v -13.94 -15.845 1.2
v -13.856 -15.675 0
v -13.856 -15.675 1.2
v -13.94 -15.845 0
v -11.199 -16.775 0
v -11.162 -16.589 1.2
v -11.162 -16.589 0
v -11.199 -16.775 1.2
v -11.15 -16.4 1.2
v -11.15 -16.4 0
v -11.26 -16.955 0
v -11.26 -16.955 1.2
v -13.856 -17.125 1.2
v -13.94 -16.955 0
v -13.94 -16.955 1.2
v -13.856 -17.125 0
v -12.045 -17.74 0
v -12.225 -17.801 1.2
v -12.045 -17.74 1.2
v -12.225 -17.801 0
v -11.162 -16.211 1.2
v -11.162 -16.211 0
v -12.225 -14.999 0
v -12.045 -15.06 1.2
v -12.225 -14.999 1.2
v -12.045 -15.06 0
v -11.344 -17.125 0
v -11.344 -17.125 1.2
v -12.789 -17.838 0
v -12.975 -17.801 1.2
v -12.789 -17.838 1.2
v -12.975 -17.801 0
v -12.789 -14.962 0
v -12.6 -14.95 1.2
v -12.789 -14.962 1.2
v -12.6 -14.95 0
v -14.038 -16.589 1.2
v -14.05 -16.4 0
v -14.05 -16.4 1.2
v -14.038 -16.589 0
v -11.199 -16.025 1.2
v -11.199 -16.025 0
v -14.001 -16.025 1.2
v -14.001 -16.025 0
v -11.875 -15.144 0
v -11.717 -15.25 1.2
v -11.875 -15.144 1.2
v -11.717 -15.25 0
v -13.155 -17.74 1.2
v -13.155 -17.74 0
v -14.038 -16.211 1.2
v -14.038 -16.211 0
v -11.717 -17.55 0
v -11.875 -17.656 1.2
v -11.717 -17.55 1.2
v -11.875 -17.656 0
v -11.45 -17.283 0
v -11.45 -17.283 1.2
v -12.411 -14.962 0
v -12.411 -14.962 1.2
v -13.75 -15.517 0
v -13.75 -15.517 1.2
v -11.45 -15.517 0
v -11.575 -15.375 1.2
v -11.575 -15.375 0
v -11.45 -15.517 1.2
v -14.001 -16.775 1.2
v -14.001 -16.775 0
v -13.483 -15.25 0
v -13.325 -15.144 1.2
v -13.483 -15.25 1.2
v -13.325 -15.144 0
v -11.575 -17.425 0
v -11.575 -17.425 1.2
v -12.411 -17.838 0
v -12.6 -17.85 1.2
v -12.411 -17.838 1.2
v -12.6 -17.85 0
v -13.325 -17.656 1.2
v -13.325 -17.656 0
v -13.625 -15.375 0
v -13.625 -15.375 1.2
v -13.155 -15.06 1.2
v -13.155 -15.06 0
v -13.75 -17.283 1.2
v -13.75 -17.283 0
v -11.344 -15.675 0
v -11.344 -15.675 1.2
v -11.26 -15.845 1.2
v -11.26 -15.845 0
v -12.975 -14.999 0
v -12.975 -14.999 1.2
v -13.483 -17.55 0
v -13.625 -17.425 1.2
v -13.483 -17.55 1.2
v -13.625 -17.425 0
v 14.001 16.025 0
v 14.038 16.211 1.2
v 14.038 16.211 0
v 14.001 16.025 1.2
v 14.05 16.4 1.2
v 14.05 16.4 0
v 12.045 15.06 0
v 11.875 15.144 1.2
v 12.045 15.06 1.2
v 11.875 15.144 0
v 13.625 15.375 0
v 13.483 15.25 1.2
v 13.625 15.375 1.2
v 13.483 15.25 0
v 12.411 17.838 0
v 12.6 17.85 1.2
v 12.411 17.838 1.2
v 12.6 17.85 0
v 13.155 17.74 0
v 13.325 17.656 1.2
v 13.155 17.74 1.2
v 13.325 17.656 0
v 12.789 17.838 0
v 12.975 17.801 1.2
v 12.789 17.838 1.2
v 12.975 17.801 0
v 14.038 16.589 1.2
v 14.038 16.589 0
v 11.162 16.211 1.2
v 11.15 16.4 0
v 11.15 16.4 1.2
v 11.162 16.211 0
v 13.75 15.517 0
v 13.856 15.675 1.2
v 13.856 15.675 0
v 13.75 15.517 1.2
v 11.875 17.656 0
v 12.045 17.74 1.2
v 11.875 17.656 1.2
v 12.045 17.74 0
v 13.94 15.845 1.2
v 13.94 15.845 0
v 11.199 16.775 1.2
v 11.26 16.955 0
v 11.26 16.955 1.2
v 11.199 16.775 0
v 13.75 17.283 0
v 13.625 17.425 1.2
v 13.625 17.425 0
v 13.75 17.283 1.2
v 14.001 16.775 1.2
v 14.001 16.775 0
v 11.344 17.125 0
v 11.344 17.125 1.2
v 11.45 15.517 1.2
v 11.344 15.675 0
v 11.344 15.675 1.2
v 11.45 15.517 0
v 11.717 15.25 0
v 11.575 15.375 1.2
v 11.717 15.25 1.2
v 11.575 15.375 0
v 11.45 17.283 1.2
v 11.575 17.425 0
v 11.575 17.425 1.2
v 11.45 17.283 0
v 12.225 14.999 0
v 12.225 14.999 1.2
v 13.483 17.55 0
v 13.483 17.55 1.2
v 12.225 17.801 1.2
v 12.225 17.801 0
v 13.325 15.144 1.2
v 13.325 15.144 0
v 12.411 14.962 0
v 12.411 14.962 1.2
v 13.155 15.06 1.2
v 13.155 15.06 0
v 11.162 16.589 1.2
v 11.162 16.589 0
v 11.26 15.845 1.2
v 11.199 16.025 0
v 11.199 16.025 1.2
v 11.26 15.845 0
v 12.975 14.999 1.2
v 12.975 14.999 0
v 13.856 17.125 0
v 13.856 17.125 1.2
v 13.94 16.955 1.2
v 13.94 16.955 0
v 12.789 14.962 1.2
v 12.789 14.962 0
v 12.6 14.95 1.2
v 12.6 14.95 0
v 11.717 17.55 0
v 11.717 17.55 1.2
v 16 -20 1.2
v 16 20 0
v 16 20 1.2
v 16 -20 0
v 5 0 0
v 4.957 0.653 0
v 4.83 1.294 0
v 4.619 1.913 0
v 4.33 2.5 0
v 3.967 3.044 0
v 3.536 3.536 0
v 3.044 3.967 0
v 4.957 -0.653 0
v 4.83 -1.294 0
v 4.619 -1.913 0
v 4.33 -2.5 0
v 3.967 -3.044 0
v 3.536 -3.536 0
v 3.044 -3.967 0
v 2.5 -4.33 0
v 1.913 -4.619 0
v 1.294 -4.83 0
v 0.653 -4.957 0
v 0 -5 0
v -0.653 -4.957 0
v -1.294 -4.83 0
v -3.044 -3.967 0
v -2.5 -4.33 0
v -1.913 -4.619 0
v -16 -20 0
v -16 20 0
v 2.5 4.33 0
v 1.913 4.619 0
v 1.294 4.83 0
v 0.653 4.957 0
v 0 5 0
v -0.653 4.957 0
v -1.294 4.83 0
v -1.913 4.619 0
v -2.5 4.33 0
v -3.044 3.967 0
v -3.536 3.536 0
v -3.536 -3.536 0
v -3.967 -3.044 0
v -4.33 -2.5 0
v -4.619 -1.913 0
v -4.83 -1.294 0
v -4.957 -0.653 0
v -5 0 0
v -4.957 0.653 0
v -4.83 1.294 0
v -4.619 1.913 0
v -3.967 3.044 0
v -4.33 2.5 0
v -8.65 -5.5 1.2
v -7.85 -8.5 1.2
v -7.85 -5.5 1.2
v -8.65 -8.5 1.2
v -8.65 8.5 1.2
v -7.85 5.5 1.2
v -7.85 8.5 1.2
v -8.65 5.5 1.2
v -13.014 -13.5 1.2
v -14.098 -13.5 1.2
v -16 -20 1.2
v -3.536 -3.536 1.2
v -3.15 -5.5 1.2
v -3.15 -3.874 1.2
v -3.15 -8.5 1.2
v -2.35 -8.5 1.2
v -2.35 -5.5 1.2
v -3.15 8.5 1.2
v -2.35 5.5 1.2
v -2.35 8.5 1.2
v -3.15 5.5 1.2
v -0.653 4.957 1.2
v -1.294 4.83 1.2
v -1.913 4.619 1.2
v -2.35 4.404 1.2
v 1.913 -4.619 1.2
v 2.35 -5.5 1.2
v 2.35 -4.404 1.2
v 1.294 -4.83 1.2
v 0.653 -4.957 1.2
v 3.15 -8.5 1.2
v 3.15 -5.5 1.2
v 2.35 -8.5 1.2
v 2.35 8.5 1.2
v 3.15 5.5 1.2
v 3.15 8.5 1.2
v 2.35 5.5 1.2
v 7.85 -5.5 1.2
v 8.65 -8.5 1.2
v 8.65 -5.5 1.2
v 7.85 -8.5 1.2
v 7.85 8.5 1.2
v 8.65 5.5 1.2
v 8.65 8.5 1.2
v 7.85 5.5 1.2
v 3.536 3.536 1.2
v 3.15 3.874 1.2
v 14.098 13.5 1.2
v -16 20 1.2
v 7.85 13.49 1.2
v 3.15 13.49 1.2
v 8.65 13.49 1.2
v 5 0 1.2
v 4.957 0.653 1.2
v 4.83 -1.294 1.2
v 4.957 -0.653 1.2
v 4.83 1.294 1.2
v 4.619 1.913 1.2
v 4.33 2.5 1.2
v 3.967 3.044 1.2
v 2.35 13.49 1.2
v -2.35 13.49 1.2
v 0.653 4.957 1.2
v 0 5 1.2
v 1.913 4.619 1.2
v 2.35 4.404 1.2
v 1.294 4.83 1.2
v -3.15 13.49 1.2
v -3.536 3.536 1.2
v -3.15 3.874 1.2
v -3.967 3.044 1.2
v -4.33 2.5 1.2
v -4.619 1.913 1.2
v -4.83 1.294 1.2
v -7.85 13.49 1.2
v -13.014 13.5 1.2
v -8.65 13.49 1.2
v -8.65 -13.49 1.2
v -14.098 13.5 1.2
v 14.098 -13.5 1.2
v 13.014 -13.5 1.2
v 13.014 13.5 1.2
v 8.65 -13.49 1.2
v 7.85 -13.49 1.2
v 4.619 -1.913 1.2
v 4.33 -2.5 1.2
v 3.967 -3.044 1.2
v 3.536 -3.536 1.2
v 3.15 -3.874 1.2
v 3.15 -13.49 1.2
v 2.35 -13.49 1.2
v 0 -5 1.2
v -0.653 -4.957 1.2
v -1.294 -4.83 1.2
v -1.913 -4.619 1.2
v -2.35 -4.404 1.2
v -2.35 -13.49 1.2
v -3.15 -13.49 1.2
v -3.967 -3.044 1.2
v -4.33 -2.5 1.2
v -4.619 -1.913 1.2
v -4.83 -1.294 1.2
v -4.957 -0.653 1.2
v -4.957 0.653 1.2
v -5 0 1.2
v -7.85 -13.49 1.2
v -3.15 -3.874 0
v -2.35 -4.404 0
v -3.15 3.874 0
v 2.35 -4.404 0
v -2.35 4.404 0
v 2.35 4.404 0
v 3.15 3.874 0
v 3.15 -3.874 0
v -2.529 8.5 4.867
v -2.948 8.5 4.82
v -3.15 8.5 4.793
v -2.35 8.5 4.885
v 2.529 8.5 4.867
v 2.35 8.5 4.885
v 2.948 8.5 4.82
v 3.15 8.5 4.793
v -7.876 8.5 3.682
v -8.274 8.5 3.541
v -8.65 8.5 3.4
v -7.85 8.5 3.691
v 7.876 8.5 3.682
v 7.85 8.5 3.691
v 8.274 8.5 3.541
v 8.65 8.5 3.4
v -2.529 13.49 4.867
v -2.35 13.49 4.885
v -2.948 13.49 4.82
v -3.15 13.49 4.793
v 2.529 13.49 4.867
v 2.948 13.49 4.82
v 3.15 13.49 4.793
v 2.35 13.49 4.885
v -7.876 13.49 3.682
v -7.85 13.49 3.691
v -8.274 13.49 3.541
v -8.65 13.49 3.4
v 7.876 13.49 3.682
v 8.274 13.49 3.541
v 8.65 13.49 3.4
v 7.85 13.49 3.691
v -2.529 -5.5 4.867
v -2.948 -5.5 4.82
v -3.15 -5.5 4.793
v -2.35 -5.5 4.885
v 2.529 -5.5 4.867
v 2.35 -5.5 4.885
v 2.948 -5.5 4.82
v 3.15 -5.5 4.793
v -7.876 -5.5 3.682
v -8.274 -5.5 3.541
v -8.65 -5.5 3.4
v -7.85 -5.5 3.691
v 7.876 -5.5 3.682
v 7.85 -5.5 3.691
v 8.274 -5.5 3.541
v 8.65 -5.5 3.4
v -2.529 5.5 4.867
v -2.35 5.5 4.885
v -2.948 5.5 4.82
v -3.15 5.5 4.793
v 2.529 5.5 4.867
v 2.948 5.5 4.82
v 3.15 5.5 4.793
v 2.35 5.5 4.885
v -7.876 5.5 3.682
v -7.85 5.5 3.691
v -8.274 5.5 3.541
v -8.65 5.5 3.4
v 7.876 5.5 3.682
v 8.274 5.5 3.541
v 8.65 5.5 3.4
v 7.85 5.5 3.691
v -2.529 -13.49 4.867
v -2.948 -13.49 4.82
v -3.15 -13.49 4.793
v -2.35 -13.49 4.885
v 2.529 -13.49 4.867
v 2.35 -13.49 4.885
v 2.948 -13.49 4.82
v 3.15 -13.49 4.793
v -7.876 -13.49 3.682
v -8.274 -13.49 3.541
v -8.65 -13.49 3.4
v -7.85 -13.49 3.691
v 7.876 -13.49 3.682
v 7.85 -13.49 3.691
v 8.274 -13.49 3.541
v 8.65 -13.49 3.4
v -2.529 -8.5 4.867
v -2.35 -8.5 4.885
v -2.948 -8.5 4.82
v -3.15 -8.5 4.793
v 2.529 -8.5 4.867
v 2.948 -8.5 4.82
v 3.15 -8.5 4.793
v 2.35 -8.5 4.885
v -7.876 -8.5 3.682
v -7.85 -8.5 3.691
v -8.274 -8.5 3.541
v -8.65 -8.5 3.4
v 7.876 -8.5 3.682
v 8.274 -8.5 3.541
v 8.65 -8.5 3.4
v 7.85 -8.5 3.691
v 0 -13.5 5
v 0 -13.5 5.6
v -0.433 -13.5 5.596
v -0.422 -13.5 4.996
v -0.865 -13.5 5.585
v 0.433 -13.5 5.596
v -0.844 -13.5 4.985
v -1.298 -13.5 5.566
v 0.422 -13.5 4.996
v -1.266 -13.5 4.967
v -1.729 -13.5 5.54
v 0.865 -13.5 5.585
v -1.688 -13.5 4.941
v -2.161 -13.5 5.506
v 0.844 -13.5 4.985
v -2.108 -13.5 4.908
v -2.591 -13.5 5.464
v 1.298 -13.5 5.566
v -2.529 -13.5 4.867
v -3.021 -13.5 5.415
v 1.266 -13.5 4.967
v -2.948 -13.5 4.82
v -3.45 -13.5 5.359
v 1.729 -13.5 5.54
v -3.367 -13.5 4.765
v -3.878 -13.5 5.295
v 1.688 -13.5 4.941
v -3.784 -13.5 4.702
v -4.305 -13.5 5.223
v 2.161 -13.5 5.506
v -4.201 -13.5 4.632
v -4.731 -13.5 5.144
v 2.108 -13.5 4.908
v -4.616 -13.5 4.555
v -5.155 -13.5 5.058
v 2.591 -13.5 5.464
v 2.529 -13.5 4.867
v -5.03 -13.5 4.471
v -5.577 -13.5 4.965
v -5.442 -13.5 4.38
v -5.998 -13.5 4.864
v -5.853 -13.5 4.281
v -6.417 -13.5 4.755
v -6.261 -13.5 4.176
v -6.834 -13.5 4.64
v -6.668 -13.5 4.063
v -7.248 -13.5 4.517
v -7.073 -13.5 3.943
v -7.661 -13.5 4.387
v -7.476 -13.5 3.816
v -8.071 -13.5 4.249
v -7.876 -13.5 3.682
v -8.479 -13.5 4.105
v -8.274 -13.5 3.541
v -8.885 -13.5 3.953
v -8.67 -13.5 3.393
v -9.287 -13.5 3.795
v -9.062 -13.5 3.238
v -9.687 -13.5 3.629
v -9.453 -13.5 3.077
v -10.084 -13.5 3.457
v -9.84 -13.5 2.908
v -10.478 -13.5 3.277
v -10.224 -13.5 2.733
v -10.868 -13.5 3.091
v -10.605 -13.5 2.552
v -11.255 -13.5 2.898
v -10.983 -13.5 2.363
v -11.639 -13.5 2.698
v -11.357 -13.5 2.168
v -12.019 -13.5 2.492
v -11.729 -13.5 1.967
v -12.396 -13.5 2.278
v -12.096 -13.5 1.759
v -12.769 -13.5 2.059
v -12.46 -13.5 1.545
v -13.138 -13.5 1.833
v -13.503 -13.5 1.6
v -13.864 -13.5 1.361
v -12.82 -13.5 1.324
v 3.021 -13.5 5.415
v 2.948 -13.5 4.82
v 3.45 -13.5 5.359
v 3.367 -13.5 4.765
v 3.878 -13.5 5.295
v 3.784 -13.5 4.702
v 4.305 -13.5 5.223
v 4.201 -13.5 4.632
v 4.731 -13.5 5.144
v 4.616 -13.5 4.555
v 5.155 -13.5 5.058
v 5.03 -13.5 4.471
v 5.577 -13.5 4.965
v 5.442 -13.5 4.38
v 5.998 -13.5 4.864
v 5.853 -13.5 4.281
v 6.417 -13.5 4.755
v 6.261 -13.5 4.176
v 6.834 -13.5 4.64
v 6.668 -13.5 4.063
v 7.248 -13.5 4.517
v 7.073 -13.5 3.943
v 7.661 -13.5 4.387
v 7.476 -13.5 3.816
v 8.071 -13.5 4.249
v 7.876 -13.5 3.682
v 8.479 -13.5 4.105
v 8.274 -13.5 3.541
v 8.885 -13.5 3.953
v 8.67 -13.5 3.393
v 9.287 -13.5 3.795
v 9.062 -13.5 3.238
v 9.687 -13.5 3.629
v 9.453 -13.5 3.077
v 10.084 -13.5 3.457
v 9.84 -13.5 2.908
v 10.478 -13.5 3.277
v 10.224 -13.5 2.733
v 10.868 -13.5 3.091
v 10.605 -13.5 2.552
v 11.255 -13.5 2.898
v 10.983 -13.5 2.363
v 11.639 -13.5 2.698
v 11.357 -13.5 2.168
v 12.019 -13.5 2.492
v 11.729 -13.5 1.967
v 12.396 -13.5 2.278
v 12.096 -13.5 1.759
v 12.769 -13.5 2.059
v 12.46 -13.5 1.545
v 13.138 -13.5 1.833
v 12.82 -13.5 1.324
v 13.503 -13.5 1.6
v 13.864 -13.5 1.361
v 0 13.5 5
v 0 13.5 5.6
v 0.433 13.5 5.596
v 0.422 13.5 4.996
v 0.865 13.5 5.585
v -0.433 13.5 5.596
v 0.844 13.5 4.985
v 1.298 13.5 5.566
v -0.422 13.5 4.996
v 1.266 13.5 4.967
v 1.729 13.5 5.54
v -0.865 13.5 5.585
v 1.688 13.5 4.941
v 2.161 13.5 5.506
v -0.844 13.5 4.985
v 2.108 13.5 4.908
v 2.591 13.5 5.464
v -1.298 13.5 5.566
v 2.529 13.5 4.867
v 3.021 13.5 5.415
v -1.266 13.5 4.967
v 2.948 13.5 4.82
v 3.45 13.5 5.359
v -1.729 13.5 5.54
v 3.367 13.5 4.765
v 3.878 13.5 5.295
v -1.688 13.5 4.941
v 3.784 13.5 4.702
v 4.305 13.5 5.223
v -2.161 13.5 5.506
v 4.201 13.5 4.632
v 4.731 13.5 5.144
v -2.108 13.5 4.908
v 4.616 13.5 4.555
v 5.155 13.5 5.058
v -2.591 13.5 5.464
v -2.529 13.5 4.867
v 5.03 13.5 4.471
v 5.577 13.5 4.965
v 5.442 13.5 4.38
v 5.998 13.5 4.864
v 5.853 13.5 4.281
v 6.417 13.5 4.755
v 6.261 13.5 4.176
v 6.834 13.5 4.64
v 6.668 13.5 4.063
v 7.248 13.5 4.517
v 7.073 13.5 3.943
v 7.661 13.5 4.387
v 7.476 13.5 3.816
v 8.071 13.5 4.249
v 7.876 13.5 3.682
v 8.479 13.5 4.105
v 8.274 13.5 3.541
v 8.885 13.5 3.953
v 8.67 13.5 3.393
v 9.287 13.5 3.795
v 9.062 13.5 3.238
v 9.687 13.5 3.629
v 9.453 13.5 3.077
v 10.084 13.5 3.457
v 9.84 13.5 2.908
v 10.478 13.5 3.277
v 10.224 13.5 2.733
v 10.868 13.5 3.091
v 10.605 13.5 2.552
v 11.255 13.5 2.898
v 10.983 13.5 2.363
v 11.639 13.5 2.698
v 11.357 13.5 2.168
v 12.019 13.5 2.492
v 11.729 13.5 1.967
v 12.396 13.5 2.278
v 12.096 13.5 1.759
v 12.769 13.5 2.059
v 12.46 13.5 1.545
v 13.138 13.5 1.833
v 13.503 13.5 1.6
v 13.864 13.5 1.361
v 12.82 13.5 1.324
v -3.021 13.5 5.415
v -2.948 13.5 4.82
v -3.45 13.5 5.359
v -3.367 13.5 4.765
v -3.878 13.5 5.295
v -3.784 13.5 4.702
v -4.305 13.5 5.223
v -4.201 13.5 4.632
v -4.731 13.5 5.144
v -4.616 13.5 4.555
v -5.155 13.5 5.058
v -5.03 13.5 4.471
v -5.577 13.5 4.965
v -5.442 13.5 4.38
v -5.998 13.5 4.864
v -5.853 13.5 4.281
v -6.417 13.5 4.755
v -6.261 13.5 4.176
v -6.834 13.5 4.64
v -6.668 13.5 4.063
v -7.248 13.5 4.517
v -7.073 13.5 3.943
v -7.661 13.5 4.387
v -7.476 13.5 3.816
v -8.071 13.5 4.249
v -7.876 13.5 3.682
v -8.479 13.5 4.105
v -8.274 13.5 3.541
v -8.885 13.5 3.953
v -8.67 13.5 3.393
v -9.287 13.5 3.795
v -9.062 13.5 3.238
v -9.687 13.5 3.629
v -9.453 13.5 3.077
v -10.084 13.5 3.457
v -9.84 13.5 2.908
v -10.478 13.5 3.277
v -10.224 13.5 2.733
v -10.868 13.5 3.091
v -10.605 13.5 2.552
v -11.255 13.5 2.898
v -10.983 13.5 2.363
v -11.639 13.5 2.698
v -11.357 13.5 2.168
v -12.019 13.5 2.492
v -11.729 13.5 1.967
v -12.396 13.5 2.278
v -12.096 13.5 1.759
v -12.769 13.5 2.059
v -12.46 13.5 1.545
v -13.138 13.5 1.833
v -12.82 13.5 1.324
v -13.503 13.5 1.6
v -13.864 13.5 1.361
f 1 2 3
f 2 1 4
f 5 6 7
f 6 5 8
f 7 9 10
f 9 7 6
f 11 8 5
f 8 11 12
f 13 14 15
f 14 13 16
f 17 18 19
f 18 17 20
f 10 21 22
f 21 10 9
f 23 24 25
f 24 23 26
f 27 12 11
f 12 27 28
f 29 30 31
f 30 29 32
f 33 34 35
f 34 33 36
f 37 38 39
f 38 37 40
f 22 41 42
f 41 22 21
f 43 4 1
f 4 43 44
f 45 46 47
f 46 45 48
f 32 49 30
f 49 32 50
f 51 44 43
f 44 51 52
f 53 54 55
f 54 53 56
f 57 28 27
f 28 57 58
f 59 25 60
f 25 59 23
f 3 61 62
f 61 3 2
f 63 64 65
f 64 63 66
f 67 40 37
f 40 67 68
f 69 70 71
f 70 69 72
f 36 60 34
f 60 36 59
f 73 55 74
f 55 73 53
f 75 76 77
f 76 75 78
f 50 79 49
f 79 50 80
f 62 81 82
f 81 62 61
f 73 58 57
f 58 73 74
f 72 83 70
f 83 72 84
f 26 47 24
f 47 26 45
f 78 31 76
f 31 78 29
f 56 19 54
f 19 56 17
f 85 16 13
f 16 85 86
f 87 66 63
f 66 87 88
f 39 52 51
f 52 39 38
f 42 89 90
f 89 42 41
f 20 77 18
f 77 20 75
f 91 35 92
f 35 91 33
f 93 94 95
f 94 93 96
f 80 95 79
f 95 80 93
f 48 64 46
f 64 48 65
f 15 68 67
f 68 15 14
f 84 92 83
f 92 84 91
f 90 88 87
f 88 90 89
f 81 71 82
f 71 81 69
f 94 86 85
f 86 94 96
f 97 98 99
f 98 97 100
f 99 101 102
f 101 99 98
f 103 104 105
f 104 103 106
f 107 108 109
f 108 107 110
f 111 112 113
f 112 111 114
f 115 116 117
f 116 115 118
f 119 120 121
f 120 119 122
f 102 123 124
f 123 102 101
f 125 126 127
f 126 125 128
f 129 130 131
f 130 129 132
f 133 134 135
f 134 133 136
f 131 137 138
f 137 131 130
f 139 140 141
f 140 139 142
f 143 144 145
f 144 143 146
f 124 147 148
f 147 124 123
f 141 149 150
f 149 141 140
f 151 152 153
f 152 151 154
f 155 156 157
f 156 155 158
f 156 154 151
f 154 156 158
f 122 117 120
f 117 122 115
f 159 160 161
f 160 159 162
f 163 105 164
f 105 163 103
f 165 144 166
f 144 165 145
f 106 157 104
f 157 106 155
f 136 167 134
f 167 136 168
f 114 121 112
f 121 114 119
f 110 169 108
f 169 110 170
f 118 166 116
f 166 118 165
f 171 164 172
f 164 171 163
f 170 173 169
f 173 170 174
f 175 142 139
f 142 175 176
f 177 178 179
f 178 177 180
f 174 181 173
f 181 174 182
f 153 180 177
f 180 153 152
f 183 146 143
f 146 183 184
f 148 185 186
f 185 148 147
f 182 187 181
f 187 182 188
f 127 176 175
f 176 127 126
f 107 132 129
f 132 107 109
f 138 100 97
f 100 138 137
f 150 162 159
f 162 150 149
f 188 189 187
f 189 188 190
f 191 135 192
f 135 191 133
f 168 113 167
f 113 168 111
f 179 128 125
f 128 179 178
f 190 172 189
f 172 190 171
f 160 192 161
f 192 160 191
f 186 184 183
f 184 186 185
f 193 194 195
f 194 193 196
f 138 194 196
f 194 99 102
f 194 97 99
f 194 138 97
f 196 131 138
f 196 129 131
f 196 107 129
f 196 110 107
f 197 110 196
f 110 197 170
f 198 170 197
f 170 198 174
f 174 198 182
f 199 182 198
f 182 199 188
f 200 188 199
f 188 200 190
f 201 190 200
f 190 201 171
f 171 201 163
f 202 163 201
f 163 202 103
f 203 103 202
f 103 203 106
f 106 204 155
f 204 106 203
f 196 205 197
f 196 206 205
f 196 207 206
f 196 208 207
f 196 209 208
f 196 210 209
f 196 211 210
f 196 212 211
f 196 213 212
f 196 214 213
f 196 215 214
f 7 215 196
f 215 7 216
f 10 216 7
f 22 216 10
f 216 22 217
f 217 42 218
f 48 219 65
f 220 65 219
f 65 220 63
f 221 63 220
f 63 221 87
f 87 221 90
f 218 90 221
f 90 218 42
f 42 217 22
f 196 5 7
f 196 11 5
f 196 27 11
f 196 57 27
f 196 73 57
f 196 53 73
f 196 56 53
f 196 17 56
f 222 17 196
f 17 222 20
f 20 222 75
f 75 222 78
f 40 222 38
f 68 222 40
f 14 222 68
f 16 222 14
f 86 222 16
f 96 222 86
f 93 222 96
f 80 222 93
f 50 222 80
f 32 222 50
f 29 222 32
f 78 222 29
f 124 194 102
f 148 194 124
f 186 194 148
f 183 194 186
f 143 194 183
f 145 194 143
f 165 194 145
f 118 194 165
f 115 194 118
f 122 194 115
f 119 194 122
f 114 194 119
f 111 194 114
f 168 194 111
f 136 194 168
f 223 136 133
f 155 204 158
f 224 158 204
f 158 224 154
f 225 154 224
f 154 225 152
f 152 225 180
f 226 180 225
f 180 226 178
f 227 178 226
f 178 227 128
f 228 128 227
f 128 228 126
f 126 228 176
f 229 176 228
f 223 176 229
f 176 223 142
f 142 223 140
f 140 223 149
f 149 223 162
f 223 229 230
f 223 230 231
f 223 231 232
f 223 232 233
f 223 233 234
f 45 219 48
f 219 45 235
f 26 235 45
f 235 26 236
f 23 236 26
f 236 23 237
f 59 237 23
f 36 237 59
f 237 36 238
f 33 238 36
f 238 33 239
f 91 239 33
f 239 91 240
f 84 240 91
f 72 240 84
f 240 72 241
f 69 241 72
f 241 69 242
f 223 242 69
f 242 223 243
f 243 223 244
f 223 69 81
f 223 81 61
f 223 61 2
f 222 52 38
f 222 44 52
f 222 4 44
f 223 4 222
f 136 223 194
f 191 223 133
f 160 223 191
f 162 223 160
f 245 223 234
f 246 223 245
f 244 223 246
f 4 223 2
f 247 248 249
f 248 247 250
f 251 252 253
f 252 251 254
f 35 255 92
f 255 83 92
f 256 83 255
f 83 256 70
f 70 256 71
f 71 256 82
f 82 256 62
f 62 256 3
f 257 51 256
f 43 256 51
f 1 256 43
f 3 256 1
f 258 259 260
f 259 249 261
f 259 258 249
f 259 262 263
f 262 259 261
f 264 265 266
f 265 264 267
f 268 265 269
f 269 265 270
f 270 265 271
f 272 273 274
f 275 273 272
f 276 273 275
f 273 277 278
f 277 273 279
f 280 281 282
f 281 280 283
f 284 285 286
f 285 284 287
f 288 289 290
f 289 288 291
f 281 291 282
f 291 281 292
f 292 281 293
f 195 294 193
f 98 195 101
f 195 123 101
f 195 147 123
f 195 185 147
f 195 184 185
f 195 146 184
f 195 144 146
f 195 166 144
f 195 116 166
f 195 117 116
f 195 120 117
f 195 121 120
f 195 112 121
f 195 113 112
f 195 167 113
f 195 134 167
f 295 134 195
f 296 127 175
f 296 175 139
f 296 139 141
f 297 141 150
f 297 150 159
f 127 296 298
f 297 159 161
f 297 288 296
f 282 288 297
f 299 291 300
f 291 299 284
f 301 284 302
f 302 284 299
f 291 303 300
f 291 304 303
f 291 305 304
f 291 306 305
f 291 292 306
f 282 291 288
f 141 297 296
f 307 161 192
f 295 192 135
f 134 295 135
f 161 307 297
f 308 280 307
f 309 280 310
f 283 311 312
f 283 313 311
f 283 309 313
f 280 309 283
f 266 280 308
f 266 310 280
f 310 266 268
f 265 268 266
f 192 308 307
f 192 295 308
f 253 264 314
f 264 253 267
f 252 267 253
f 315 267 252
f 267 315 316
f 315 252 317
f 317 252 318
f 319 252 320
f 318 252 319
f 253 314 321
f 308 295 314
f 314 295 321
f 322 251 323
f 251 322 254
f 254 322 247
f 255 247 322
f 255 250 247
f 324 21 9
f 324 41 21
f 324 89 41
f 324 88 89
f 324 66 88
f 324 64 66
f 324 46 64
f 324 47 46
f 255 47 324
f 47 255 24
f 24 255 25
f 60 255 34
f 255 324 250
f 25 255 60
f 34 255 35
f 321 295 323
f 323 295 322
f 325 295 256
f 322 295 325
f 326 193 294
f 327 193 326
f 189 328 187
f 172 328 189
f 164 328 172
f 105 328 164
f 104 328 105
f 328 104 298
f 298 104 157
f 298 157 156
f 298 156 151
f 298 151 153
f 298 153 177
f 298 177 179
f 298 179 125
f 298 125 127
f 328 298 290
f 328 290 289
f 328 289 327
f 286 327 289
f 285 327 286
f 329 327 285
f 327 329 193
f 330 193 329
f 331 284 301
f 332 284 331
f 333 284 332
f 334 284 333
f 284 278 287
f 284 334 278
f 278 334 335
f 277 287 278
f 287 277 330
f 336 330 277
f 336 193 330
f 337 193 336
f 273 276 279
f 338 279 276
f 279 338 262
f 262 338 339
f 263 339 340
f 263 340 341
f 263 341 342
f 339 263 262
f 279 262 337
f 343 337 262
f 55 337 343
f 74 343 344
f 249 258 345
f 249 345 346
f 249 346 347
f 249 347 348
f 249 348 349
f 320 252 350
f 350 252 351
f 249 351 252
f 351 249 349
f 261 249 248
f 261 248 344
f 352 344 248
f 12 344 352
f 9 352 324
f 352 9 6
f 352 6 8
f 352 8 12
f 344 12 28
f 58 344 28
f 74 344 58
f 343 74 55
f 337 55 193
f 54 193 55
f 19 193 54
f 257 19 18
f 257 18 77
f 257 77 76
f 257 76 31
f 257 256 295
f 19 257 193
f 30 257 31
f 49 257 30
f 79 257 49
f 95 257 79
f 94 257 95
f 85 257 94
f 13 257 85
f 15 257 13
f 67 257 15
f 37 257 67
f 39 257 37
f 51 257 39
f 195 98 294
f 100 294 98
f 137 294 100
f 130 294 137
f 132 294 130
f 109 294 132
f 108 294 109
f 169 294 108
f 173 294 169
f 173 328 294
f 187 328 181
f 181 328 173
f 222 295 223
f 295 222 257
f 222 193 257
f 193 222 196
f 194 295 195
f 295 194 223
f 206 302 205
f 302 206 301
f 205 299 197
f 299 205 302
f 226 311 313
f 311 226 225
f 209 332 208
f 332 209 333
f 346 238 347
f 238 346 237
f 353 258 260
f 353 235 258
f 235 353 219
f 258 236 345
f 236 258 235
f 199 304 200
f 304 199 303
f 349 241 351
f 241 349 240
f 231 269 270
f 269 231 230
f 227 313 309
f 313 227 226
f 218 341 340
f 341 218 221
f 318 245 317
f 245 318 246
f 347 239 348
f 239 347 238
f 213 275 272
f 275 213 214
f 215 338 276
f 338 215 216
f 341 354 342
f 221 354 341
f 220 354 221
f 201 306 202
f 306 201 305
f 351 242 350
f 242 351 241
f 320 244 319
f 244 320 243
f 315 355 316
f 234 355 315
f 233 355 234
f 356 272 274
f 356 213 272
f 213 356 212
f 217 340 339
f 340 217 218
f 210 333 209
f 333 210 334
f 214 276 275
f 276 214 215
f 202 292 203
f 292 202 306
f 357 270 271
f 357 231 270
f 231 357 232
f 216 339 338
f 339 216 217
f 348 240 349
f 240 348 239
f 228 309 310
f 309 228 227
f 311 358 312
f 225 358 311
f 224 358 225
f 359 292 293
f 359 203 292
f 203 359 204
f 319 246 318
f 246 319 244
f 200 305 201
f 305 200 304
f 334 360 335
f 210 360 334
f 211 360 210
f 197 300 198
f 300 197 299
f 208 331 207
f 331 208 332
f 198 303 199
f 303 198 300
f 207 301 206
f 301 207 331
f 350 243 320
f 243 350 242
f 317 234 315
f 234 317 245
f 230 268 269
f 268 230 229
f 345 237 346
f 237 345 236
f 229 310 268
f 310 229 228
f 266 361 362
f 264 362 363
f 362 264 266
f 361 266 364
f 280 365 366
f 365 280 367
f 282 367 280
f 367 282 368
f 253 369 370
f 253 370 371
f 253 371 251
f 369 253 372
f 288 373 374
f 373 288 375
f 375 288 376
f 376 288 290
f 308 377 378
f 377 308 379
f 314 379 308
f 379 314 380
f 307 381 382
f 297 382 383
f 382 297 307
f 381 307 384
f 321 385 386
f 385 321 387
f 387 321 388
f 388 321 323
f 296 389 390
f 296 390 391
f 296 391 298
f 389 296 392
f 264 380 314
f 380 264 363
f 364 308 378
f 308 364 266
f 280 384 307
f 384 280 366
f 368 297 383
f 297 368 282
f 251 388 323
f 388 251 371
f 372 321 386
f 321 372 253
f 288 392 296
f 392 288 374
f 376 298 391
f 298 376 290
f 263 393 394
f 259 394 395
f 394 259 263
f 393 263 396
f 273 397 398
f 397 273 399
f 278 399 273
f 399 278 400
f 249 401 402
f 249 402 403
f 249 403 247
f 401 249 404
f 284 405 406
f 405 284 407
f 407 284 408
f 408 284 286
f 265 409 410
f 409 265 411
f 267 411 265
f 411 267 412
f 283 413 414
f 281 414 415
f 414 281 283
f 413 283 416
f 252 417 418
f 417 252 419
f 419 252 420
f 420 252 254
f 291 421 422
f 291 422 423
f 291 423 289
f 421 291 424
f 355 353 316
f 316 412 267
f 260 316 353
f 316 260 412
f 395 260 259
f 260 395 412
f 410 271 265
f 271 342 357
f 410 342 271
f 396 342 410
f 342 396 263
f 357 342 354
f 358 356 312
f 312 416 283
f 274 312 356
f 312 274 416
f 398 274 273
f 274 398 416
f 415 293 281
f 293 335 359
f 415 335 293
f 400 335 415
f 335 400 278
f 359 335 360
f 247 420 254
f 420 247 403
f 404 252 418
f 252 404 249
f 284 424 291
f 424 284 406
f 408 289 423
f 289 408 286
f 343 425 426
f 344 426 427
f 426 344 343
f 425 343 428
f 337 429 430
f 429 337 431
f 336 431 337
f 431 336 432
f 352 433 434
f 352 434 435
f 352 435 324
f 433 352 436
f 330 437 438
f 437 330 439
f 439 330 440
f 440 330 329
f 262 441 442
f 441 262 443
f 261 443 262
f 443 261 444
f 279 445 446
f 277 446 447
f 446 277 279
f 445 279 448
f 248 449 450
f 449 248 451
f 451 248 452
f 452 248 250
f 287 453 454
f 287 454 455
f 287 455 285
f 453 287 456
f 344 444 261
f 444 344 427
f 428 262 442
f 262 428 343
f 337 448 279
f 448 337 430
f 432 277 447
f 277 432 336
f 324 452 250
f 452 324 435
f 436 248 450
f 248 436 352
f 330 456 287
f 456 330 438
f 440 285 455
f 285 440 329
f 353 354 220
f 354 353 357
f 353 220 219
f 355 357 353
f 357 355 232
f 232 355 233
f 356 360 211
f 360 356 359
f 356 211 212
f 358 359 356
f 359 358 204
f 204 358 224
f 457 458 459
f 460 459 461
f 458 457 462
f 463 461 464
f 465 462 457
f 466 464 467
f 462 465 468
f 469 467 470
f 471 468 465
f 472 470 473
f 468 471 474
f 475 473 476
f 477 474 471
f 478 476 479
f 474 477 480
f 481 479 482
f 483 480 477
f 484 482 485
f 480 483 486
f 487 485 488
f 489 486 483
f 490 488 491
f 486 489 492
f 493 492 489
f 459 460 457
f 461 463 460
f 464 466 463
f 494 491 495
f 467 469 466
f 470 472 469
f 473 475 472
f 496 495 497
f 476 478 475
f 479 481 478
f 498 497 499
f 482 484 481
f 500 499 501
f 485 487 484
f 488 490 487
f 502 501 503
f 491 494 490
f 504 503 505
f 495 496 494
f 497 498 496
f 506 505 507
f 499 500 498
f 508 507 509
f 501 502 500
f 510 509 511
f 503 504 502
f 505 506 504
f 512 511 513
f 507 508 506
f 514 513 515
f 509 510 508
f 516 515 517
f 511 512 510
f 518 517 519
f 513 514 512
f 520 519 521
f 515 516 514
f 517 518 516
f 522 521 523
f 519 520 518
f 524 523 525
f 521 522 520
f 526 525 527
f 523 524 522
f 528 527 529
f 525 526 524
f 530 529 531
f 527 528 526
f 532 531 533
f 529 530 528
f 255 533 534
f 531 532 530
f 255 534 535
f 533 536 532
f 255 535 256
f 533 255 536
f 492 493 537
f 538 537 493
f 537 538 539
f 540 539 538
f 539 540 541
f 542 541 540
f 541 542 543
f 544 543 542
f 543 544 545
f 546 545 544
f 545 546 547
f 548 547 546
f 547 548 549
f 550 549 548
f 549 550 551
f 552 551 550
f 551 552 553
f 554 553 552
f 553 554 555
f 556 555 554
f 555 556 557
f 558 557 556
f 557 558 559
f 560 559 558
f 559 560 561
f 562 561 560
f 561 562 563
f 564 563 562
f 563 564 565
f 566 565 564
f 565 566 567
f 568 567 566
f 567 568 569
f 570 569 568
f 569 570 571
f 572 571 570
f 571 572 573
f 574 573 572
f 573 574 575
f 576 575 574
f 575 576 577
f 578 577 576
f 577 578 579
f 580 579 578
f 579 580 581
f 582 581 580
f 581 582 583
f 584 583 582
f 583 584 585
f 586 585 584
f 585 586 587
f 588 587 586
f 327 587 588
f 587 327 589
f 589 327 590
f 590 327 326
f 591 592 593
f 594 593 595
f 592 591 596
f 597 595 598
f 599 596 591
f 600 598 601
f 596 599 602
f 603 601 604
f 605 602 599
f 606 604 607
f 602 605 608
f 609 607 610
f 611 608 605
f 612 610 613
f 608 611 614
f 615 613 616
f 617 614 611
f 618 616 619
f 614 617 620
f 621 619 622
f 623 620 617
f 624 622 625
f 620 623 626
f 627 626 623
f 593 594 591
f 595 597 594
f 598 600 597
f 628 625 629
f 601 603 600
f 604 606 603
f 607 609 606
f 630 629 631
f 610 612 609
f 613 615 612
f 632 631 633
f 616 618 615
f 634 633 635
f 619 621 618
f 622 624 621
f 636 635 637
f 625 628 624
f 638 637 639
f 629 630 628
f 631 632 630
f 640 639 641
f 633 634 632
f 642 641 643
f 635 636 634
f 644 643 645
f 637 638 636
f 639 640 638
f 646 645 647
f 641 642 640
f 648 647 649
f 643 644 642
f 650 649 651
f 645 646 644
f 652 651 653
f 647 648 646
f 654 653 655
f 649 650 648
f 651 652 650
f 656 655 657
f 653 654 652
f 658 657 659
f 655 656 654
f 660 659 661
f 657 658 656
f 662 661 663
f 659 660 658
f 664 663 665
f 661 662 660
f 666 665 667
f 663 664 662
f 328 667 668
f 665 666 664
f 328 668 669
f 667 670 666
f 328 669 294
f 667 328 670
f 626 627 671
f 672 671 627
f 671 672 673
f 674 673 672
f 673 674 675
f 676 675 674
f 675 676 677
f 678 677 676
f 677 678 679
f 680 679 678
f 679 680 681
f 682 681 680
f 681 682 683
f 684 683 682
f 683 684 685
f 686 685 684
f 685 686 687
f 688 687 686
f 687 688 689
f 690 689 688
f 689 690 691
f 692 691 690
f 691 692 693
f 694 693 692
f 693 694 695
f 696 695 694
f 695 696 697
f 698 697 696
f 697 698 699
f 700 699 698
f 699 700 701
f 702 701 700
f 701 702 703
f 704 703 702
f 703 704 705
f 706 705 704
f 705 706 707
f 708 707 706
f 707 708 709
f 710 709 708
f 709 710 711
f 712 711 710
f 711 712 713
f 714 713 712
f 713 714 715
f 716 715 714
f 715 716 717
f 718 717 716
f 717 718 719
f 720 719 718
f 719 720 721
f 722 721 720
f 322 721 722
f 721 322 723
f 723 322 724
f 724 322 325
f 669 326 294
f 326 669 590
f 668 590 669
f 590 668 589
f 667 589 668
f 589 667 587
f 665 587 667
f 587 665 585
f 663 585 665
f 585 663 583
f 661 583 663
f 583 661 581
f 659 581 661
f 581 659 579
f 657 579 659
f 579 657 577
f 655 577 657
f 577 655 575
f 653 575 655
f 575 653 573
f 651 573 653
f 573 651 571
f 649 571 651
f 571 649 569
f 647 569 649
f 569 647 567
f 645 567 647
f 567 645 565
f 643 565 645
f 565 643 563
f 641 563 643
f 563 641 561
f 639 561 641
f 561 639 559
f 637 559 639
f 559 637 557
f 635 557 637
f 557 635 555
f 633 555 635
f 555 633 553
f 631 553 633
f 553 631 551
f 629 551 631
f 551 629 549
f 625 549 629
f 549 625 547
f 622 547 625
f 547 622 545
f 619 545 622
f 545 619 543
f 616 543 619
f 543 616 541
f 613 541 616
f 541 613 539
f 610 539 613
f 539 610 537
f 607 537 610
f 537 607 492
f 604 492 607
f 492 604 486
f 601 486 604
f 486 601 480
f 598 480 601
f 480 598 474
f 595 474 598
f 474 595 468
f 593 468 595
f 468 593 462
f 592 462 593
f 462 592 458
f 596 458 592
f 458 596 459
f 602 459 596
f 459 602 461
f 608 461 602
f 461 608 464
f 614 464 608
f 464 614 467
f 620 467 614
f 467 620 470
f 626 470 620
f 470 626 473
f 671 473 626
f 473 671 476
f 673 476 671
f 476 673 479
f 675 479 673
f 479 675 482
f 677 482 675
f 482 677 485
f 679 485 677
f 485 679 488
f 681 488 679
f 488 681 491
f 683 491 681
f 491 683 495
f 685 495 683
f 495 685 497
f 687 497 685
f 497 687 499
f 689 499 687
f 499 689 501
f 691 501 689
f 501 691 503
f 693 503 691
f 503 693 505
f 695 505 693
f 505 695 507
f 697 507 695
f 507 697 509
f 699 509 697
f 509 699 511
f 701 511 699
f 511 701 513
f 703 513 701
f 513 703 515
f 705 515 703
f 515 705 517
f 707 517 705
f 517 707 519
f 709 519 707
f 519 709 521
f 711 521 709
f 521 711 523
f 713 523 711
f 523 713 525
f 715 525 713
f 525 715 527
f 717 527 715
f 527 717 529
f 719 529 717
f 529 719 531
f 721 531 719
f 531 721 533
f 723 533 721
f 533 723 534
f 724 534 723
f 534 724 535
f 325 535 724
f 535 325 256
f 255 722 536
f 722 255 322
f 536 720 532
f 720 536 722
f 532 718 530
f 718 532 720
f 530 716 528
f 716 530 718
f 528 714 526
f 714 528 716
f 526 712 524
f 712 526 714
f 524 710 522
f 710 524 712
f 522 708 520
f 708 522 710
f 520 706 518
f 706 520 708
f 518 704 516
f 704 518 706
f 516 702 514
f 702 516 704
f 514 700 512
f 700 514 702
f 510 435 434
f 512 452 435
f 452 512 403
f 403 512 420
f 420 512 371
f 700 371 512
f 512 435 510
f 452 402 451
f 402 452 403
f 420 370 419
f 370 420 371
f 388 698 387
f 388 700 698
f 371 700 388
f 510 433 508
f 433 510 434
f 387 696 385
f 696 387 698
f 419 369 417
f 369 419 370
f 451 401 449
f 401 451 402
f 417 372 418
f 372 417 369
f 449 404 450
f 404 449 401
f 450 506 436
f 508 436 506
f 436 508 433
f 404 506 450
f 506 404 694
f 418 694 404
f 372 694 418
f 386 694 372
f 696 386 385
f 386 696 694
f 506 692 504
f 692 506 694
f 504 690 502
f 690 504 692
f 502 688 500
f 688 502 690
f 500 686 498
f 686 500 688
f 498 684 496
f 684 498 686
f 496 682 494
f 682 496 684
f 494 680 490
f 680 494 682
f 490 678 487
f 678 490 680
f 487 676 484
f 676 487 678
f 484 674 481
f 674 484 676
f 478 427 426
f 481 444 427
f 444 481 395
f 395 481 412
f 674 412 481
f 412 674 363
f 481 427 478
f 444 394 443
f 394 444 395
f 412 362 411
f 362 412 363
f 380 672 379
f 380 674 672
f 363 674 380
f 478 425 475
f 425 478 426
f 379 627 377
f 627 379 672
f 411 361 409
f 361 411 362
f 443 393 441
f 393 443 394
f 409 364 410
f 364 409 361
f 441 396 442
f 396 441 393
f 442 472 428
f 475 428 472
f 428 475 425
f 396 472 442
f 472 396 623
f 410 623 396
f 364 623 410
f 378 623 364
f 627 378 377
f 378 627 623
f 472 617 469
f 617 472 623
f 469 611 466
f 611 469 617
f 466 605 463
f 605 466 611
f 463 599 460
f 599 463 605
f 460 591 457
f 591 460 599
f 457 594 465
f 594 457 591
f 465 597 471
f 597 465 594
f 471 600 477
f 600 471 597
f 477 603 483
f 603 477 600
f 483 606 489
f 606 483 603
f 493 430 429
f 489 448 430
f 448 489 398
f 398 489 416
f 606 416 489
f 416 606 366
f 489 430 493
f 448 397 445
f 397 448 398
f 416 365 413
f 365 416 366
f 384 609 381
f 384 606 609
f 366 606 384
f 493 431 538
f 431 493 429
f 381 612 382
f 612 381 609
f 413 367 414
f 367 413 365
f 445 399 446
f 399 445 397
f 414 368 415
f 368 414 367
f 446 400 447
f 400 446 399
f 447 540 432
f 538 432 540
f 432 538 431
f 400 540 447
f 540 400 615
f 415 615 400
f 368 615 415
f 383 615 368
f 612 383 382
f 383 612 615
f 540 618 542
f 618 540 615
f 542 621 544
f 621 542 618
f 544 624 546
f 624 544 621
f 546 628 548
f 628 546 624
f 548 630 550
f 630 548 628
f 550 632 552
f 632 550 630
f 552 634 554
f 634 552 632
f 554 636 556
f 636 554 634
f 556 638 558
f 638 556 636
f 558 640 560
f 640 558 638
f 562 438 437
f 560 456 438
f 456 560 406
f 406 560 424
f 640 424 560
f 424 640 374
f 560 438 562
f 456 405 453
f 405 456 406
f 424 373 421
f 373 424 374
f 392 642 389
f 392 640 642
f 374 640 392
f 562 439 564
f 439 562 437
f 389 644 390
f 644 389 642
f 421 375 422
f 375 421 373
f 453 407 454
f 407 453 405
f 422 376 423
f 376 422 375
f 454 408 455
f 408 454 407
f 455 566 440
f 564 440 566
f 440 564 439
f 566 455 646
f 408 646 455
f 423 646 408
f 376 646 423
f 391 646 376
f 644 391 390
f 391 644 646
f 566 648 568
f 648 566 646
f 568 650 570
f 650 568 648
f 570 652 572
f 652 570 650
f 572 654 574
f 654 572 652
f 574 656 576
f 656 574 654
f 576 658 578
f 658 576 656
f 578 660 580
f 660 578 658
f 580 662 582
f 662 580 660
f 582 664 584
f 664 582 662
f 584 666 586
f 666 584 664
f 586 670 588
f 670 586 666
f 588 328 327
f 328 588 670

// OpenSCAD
// The overhead screen's cover, floor on the bed: floor, then a shallow arch held up by four gapped fins; spans of 2.5 mm or less, no supports.
use <model.scad>

overhead_cover_print();
